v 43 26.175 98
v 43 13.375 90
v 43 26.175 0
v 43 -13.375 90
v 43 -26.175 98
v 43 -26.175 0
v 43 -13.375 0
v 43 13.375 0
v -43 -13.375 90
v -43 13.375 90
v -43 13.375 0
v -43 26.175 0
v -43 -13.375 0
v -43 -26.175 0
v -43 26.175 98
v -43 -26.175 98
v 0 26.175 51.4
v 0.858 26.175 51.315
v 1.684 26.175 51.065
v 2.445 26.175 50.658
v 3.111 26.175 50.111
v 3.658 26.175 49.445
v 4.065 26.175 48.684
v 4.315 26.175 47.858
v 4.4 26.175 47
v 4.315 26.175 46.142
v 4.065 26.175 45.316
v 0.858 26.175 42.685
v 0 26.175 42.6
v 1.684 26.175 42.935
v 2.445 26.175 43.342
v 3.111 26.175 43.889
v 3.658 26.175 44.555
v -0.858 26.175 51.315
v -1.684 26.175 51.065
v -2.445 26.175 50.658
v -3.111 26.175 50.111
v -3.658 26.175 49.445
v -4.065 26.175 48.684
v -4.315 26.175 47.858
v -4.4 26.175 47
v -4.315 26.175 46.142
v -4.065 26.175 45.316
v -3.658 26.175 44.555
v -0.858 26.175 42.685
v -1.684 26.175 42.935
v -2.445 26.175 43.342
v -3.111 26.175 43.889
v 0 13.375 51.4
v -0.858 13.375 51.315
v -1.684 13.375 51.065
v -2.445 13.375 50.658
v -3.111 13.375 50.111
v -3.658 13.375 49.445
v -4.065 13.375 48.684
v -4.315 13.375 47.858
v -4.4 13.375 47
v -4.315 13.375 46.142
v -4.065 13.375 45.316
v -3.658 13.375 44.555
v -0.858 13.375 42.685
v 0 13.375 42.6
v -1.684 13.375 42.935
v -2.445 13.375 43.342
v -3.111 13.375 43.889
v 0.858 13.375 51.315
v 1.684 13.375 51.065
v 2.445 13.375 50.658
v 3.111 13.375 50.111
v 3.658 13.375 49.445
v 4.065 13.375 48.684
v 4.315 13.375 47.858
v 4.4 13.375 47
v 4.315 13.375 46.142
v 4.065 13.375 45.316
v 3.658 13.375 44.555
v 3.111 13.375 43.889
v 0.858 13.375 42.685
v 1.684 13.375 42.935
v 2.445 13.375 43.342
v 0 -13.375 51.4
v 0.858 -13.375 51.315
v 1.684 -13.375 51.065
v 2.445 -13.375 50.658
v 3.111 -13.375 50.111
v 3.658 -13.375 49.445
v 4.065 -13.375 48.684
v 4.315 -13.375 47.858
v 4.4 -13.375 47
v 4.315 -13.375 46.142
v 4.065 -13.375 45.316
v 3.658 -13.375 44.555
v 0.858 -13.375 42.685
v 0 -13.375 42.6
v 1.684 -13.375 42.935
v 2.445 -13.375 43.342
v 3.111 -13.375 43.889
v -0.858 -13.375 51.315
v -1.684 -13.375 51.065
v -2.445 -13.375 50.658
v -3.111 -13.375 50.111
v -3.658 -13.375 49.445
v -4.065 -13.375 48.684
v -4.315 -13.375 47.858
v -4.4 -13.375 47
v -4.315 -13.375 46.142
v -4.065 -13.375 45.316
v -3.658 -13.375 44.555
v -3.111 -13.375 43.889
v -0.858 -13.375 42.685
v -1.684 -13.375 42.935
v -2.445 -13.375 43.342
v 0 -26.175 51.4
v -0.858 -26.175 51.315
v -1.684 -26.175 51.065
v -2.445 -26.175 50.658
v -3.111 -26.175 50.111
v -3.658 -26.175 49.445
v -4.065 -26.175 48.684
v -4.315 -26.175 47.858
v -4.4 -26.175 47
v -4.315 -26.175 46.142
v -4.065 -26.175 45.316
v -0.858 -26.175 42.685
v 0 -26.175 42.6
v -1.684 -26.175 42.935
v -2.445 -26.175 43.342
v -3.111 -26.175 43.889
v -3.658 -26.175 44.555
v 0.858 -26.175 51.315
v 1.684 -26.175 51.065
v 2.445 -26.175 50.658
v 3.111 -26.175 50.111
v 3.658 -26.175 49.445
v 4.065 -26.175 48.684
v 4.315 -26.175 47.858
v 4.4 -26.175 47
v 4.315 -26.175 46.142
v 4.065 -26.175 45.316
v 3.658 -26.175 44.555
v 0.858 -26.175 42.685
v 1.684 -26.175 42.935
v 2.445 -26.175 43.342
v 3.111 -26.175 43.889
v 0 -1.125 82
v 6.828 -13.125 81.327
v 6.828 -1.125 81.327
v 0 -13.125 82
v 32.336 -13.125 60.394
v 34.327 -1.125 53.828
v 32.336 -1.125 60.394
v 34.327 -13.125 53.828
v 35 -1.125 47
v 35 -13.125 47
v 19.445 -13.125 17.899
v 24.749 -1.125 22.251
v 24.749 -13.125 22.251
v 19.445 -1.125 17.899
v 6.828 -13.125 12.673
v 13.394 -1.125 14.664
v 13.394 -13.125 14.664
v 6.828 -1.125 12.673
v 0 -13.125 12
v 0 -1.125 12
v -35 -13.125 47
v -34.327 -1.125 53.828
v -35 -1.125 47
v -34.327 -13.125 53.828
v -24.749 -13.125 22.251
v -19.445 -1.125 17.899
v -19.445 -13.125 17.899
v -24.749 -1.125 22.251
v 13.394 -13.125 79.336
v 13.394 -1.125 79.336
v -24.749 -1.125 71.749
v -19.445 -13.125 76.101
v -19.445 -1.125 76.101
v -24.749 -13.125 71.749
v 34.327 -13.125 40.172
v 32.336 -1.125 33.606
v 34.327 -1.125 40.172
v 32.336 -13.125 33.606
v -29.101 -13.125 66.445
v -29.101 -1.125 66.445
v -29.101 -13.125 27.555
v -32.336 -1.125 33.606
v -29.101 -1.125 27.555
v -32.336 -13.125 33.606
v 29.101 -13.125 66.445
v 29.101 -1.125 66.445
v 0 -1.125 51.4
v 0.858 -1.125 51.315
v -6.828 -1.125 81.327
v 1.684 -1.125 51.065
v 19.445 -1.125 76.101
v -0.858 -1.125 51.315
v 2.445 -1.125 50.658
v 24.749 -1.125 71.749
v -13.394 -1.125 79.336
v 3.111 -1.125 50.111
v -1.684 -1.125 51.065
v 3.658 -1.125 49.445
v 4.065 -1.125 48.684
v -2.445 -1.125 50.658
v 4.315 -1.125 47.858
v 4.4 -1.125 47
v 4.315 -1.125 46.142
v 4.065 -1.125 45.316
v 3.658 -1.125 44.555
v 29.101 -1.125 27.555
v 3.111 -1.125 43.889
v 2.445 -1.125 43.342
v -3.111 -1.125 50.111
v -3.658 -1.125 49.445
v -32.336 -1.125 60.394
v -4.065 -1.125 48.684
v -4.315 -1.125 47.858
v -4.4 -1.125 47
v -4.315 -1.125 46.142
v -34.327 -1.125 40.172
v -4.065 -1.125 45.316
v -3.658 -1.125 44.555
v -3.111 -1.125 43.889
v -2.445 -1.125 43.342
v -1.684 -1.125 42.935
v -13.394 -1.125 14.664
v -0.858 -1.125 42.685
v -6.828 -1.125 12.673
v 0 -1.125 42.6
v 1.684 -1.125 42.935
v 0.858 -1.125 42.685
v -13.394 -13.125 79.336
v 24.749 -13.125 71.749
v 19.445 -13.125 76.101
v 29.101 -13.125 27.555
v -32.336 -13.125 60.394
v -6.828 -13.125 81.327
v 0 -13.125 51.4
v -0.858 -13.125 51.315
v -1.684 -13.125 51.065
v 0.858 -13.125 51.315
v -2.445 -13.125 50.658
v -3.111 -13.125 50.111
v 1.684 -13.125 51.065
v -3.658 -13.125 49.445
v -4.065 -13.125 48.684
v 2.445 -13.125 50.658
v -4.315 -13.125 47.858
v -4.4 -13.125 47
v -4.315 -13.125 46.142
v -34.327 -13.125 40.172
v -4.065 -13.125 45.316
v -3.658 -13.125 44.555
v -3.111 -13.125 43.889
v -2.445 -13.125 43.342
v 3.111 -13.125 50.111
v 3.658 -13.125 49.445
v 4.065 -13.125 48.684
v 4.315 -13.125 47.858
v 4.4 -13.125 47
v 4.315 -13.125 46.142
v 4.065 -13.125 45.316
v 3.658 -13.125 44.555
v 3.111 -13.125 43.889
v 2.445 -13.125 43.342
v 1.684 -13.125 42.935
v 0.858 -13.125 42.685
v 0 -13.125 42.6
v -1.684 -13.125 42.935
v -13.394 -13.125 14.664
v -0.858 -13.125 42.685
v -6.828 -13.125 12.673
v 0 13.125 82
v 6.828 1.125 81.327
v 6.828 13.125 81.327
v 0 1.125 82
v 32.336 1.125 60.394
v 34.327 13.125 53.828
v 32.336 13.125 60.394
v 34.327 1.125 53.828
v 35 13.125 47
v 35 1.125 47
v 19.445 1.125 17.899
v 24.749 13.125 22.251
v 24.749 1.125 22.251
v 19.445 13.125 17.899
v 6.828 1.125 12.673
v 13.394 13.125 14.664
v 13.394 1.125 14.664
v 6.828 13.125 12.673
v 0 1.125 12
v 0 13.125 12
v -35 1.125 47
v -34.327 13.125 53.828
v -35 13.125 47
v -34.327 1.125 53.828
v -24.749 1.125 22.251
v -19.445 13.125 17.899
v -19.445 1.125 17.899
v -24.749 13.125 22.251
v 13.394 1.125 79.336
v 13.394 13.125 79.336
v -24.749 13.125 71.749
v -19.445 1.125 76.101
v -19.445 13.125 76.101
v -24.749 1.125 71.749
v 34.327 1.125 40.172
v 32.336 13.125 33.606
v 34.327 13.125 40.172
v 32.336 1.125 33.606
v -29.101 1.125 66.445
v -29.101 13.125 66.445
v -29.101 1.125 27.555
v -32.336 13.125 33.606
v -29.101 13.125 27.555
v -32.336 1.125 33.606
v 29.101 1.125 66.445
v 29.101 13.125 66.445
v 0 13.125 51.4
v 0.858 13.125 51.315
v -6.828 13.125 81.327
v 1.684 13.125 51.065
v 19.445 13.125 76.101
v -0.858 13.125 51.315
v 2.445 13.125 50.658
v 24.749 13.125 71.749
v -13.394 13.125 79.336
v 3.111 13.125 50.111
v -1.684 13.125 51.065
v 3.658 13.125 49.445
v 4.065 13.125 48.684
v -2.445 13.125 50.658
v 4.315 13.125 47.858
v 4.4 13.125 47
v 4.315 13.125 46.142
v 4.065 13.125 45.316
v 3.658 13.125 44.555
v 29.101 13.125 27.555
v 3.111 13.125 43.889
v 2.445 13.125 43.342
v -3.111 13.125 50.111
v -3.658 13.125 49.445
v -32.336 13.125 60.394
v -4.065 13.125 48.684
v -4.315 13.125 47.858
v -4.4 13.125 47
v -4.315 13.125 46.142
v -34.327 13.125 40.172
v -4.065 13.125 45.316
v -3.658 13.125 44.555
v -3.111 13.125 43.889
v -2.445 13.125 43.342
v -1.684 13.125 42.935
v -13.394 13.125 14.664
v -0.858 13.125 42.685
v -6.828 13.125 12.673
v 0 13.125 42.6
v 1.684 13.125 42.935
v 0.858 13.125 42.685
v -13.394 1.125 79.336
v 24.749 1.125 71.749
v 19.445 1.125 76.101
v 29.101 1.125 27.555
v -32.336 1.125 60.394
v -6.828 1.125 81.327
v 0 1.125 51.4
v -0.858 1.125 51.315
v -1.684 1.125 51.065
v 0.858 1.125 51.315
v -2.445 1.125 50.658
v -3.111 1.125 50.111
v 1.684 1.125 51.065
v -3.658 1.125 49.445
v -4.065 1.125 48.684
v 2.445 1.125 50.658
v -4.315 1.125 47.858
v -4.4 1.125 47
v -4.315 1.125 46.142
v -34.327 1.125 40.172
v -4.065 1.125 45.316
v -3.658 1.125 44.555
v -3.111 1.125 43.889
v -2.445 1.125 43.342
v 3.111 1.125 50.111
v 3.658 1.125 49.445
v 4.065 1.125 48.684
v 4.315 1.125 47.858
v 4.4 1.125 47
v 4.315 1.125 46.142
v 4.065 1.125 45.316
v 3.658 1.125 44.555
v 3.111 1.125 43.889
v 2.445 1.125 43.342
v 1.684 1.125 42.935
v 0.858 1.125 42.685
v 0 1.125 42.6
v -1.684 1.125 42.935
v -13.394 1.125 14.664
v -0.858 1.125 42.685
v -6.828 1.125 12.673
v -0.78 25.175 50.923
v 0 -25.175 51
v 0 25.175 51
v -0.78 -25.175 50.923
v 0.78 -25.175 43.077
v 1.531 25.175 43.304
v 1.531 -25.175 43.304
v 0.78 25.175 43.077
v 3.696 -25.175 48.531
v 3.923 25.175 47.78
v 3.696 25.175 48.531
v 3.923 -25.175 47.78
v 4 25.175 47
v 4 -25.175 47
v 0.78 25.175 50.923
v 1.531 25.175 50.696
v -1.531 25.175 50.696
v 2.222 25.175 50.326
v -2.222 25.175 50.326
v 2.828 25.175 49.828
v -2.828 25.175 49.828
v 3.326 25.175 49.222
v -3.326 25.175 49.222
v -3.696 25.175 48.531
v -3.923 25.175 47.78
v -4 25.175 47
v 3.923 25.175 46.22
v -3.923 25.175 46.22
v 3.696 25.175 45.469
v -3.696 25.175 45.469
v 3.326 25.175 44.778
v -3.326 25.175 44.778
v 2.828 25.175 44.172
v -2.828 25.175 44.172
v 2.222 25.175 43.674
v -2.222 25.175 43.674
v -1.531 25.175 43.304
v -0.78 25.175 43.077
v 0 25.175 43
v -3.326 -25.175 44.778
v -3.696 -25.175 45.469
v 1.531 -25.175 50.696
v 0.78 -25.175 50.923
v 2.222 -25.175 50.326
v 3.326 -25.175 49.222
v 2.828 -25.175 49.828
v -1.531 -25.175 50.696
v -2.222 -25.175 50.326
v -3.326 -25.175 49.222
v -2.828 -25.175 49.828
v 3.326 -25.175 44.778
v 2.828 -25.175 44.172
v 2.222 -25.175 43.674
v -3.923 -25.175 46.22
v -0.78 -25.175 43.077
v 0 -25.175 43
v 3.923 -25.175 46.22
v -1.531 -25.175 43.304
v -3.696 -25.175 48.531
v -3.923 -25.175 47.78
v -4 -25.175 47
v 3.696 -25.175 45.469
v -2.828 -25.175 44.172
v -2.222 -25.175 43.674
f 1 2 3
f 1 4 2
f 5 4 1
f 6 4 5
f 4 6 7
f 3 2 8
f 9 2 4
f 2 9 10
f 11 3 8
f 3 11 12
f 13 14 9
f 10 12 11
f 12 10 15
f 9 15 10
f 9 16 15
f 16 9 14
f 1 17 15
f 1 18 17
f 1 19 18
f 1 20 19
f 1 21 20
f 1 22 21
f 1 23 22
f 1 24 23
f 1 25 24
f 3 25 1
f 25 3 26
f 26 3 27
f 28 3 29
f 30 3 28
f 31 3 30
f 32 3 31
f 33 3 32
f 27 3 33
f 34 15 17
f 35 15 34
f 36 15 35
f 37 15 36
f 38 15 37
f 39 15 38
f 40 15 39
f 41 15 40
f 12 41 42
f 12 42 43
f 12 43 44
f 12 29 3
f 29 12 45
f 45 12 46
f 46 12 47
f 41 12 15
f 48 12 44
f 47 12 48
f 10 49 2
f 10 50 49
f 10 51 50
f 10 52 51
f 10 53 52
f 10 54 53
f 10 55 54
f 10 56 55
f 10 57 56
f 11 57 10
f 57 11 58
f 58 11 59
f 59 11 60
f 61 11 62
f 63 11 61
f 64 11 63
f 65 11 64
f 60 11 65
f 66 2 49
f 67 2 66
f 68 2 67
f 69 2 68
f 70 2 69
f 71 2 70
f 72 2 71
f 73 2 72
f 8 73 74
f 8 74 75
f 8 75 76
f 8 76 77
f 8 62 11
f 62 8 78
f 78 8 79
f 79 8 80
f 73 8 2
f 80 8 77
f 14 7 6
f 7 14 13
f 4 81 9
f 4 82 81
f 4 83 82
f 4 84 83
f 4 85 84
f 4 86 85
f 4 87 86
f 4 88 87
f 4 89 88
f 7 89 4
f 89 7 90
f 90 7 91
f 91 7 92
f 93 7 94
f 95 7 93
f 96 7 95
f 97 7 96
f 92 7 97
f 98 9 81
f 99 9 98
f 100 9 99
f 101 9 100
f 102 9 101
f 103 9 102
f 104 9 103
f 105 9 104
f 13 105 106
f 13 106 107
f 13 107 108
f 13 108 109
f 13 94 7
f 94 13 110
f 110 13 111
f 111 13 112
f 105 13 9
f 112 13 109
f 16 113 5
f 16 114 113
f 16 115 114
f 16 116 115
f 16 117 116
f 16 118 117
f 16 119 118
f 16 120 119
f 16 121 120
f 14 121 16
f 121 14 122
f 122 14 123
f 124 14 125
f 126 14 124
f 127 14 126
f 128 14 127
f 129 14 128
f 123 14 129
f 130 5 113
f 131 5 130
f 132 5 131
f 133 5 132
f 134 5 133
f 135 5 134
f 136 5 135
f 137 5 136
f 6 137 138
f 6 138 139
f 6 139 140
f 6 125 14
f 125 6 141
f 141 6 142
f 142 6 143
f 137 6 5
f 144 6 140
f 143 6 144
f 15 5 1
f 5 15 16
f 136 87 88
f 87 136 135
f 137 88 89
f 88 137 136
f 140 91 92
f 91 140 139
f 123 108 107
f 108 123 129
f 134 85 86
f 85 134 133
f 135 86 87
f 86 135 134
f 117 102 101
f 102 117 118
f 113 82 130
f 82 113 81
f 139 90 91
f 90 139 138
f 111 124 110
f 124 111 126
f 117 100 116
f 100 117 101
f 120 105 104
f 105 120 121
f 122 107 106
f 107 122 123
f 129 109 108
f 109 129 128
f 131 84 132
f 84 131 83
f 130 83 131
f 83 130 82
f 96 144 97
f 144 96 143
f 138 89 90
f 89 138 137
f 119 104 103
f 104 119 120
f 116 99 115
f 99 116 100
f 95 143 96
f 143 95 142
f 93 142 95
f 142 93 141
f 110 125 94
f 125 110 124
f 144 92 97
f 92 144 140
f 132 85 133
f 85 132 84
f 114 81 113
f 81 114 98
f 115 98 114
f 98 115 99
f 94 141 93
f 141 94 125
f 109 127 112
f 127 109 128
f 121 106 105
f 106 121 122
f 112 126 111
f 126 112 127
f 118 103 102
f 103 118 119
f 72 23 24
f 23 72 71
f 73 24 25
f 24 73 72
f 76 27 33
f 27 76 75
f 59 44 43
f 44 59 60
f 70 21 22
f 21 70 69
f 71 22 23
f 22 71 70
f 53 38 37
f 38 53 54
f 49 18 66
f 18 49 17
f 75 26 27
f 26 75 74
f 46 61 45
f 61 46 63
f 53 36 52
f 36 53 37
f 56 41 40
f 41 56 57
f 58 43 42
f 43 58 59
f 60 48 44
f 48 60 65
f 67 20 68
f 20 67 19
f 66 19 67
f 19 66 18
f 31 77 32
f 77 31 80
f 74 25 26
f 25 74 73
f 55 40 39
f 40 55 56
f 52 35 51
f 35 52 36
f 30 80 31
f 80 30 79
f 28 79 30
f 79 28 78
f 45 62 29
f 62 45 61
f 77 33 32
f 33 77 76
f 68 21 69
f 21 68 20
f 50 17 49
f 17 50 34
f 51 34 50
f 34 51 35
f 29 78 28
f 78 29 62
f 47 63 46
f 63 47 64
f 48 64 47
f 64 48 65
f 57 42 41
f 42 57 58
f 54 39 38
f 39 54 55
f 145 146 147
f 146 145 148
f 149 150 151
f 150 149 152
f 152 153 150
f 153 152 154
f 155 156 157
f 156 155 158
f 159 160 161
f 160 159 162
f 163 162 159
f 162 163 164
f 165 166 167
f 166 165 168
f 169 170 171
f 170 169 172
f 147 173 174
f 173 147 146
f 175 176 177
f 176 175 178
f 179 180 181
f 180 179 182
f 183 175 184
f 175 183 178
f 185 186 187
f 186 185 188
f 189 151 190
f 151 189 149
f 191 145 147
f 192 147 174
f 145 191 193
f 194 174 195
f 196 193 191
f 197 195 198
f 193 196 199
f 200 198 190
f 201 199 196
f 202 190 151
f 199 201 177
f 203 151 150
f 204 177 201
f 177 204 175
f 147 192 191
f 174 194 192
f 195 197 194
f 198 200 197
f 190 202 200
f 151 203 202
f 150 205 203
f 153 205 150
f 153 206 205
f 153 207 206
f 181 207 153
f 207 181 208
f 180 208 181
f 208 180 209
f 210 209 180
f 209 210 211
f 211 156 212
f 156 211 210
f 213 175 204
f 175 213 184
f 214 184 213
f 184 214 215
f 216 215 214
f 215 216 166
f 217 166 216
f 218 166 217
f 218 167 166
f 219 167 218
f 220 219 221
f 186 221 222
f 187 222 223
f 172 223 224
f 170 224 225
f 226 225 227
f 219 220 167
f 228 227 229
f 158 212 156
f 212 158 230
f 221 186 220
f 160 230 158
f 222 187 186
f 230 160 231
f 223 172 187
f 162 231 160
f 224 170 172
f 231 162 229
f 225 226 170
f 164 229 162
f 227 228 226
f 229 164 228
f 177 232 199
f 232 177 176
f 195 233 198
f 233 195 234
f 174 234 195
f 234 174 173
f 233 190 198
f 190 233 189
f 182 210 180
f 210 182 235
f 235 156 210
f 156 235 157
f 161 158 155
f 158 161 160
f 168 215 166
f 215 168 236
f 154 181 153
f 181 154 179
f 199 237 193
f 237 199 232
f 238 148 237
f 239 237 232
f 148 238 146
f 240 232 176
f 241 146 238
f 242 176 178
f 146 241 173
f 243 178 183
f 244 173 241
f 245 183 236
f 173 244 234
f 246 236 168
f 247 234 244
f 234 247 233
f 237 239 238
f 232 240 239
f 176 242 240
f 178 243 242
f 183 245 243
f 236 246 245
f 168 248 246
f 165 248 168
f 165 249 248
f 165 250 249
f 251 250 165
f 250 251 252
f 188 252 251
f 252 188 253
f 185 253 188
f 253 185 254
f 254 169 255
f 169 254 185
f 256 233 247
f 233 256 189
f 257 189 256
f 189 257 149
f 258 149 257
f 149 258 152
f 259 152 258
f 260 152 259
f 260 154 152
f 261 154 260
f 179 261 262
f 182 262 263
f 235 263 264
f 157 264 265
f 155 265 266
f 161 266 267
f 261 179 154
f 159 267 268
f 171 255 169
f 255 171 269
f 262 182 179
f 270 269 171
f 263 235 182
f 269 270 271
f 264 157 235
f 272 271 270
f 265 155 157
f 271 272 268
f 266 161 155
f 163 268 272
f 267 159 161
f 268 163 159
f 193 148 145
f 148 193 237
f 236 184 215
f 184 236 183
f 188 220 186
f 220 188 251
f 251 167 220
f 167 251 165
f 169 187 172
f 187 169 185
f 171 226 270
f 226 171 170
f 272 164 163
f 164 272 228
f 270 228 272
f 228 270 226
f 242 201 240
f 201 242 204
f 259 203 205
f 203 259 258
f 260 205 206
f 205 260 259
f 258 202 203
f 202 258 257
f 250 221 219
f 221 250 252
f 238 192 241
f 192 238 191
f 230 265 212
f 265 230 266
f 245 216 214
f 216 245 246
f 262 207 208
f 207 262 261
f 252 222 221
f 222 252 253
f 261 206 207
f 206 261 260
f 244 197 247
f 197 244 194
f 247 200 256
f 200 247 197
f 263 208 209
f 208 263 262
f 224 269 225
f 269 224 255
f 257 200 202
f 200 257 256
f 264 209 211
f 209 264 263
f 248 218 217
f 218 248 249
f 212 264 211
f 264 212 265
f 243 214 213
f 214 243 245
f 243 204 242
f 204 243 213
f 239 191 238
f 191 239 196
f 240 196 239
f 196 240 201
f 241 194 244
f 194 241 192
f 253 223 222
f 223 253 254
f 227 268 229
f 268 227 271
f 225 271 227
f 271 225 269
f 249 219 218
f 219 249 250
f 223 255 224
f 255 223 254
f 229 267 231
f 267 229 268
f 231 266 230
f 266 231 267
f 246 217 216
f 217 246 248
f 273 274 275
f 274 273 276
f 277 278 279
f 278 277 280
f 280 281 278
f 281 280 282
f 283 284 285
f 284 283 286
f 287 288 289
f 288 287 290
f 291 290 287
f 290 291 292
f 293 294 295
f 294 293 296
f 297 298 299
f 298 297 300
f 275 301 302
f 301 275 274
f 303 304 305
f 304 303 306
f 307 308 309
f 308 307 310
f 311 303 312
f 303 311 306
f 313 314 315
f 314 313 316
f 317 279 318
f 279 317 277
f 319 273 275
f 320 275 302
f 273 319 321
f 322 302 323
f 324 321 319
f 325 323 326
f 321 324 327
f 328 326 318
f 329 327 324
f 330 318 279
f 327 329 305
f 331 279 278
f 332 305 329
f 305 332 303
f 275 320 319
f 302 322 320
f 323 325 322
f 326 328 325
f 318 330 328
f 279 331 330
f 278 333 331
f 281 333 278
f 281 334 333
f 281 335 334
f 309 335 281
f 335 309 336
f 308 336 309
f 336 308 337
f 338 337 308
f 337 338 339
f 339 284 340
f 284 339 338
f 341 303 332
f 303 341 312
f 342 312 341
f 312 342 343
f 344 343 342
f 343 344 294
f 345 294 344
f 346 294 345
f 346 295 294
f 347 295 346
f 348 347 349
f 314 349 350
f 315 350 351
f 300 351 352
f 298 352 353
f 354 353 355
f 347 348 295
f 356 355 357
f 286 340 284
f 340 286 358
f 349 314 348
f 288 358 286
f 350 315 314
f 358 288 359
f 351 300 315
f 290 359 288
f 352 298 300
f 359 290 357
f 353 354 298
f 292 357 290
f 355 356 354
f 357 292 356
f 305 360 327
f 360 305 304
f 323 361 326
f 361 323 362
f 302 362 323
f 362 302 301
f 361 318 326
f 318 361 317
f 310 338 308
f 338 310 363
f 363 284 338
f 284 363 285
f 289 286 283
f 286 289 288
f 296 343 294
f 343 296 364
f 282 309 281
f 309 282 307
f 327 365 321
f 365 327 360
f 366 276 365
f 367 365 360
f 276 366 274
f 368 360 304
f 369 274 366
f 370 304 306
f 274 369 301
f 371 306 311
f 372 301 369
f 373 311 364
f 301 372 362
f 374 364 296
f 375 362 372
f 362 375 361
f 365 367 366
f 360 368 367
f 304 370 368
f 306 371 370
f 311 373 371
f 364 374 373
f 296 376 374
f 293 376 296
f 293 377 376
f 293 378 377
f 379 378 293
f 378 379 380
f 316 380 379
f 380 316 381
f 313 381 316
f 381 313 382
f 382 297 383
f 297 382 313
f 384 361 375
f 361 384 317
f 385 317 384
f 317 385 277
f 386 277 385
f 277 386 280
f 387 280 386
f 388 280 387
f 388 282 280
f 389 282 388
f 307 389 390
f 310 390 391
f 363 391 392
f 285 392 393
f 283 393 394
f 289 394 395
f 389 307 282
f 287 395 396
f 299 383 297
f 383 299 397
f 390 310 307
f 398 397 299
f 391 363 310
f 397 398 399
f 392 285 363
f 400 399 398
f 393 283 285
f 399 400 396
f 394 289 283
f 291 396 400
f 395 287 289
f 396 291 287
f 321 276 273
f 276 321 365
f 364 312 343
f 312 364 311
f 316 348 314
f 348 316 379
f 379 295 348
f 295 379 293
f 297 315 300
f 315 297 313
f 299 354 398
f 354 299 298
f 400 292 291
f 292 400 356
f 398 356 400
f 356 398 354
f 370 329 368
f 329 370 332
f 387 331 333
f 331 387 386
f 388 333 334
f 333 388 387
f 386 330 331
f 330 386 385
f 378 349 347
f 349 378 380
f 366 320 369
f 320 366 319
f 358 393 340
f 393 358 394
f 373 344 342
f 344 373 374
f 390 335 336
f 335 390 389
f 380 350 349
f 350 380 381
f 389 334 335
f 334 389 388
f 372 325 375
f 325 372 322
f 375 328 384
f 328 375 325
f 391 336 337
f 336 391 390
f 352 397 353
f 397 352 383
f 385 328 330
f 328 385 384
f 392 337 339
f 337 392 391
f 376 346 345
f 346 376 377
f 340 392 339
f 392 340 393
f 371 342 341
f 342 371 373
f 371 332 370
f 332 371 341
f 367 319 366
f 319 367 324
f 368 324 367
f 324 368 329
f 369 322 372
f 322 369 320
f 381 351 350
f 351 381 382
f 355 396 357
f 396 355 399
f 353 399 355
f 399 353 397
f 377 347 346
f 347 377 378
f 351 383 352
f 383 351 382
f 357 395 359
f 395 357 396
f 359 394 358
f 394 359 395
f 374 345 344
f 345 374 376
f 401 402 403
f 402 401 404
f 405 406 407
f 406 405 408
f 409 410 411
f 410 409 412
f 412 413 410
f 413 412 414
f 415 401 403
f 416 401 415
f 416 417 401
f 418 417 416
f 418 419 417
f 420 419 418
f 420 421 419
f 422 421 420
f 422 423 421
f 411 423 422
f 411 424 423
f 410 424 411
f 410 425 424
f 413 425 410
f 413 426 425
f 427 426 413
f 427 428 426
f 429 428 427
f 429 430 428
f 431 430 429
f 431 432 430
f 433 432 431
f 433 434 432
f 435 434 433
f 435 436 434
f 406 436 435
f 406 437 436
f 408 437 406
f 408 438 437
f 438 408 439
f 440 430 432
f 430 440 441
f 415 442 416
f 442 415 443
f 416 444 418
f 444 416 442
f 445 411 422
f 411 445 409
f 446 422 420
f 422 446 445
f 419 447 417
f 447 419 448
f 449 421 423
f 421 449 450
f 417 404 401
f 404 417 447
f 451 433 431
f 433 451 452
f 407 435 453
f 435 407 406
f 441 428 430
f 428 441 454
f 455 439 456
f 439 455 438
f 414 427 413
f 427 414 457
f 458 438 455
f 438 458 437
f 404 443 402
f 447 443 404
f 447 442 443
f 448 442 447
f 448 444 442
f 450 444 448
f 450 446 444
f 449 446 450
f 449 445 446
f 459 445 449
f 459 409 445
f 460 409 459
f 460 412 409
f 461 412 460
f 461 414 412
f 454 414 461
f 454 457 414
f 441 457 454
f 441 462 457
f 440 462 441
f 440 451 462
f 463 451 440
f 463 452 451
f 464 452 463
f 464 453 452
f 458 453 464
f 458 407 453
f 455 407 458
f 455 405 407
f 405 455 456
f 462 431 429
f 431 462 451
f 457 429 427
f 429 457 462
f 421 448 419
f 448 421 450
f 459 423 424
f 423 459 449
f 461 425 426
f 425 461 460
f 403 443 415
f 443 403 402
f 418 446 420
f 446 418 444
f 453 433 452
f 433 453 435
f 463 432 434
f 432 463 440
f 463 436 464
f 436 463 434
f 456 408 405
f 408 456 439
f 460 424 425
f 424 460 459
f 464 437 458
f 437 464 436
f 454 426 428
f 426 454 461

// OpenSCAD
$fn = 32;

// ------------------------------------------------------------------------
// Trolley wheel set: wheels d70, fork 90 mm tall
// Every part is its own module, assembly() places every instance.
// ------------------------------------------------------------------------

// --- part 1 ---
module trolley_fork() {
  difference() {
    union() {
      translate([-43, 13.375, 0]) cube([86, 12.8, 90]);
      translate([-43, -26.175, 0]) cube([86, 12.8, 90]);
      translate([-43, -26.175, 90]) cube([86, 52.35, 8]);
    }
    translate([0, -19.775, 47]) rotate([90, 0, 0]) cylinder(h = 14.8, d = 8.8, center = true);
    translate([0, 19.775, 47]) rotate([90, 0, 0]) cylinder(h = 14.8, d = 8.8, center = true);
  }
}

// --- part 2 ---
module trolley_wheel() {
  difference() {
      translate([0, 0, 0]) cylinder(h = 12, d = 70);
      translate([0, 0, -1]) cylinder(h = 14, d = 8.8);
    }
}

// --- part 3 ---
module trolley_axle() {
  translate([0, 0, -25.175]) cylinder(h = 50.35, d = 8);
}

// --- assembly ---
module assembly() {
  color([0.80, 0.24, 0.20]) translate([0, 0, 0]) rotate([0, 0, 0]) trolley_fork();
  color([0.20, 0.45, 0.75]) translate([0, -1.125, 47]) rotate([90, 0, 0]) trolley_wheel();
  color([0.25, 0.62, 0.32]) translate([0, 13.125, 47]) rotate([90, 0, 0]) trolley_wheel();
  color([0.92, 0.70, 0.18]) translate([0, 0, 47]) rotate([90, 0, 0]) trolley_axle();
}

assembly();
